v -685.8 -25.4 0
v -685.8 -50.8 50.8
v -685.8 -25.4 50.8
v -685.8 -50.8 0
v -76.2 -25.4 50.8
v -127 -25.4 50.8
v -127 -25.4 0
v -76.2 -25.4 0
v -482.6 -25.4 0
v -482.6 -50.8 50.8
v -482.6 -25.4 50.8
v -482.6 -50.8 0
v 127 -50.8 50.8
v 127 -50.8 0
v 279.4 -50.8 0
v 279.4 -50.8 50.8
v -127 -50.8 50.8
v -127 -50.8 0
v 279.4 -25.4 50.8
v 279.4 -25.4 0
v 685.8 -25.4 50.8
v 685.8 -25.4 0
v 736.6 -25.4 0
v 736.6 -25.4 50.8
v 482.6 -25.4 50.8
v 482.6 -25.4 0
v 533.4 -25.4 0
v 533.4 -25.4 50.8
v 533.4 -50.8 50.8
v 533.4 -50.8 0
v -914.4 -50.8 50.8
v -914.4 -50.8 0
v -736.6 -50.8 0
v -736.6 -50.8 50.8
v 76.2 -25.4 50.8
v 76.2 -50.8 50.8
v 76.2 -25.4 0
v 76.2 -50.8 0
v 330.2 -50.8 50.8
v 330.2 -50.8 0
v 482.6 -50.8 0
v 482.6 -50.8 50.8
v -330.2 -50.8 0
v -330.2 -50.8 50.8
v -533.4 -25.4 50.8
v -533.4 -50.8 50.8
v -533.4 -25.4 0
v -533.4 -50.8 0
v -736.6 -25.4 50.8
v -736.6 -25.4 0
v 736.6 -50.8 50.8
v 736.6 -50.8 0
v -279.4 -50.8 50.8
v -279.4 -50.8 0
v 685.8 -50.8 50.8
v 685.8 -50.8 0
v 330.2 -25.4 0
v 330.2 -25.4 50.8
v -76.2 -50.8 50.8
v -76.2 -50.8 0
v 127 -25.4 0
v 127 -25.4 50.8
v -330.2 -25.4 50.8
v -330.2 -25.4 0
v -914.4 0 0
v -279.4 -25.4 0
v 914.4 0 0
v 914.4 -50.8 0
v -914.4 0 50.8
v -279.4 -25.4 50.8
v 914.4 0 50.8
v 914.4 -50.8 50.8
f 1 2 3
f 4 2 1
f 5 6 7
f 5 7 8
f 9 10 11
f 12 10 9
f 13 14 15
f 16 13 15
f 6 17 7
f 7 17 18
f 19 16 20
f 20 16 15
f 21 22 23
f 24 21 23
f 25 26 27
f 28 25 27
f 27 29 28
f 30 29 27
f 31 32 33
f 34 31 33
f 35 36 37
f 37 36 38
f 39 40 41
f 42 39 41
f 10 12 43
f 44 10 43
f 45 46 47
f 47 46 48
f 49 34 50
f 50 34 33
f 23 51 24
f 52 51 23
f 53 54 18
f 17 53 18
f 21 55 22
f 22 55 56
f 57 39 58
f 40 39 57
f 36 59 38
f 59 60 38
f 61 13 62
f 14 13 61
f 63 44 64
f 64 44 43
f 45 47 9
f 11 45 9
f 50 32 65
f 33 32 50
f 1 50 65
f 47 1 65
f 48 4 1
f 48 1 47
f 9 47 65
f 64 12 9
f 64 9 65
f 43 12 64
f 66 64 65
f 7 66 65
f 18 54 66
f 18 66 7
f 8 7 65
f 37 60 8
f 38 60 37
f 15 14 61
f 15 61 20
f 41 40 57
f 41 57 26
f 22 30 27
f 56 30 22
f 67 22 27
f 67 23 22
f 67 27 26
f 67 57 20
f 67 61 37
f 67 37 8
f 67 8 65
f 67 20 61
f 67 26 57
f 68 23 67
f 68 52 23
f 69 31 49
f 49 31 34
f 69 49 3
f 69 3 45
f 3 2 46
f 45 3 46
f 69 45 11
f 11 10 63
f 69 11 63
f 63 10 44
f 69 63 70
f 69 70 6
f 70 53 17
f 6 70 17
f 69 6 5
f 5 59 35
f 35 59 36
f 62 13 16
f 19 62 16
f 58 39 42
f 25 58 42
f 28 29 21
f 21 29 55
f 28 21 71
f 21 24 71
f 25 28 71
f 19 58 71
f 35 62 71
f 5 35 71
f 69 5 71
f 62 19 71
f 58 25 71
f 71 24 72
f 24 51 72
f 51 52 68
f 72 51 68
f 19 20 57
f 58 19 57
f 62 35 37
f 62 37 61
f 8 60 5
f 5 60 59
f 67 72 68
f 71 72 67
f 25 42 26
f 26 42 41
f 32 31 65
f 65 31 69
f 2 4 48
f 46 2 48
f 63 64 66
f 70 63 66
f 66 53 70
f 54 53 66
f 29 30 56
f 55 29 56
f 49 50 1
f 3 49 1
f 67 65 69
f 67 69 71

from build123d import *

# Parameters (mm, degrees)
F1_DEPTH = 25.4
F0_W     = 482.6
F0_H     = 50.8
F0_W_2   = 152.4
F2_W     = 2438.4
F2_H     = 50.8
F3_DEPTH = 25.4
F5_W     = 304.8
F5_H     = 50.8
F6_DEPTH = 63.5
F7_ANGLE = -90


with BuildPart() as f1:
    # F0 (on Top) → F1 (new body)
    with BuildSketch(Plane.XY):
        Polygon((-76.2, 0), (0, 0), (76.2, 0), (76.2, 50.8), (-76.2, 50.8), align=None)
    extrude(amount=F1_DEPTH)


with BuildPart() as f1b:
    # F0 (on Top) → F1, piece 2 (new body)
    with BuildSketch(Plane.XY):
        with Locations((-977.9, 25.4)):
            Rectangle(F0_W, F0_H)
    extrude(amount=F1_DEPTH)


with BuildPart() as f1c:
    # F0 (on Top) → F1, piece 3 (new body)
    with BuildSketch(Plane.XY):
        with Locations((977.9, 25.4)):
            Rectangle(F0_W, F0_H)
    extrude(amount=F1_DEPTH)


with BuildPart() as f1d:
    # F0 (on Top) → F1, piece 4 (new body)
    with BuildSketch(Plane.XY):
        with Locations((203.2, 25.4)):
            Rectangle(F0_W_2, F0_H)
    extrude(amount=F1_DEPTH)


with BuildPart() as f1e:
    # F0 (on Top) → F1, piece 5 (new body)
    with BuildSketch(Plane.XY):
        with Locations((406.4, 25.4)):
            Rectangle(F0_W_2, F0_H)
    extrude(amount=F1_DEPTH)


with BuildPart() as f1f:
    # F0 (on Top) → F1, piece 6 (new body)
    with BuildSketch(Plane.XY):
        with Locations((609.6, 25.4)):
            Rectangle(F0_W_2, F0_H)
    extrude(amount=F1_DEPTH)


with BuildPart() as f1g:
    # F0 (on Top) → F1, piece 7 (new body)
    with BuildSketch(Plane.XY):
        with Locations((-203.2, 25.4)):
            Rectangle(F0_W_2, F0_H)
    extrude(amount=F1_DEPTH)


with BuildPart() as f1h:
    # F0 (on Top) → F1, piece 8 (new body)
    with BuildSketch(Plane.XY):
        with Locations((-406.4, 25.4)):
            Rectangle(F0_W_2, F0_H)
    extrude(amount=F1_DEPTH)


with BuildPart() as f1i:
    # F0 (on Top) → F1, piece 9 (new body)
    with BuildSketch(Plane.XY):
        with Locations((-609.6, 25.4)):
            Rectangle(F0_W_2, F0_H)
    extrude(amount=F1_DEPTH)


with BuildPart() as f3:
    # F2 (on face) → F3 (new body)
    with BuildSketch(Plane.XY.offset(25.4)):
        with Locations((0, 25.4)):
            Rectangle(F2_W, F2_H)
    extrude(amount=F3_DEPTH)


with BuildPart() as f1b_1:
    add(f1b.part)

    # F4: union F1c, F1, F1d, F1e, F1f, F1g, F1h, F1i, F3
    add(f1c.part)
    add(f1.part)
    add(f1d.part)
    add(f1e.part)
    add(f1f.part)
    add(f1g.part)
    add(f1h.part)
    add(f1i.part)
    add(f3.part)

    # F5 (on face) → F6 (cut)
    with BuildSketch(Plane.XZ):
        with Locations((-1066.8, 25.4)):
            Rectangle(F5_W, F5_H)
        with Locations((1066.8, 25.4)):
            Rectangle(F5_W, F5_H)
    extrude(amount=-F6_DEPTH, mode=Mode.SUBTRACT)


with BuildPart() as f1b_2:
    # F7: moved
    add(f1b_1.part.rotate(Axis((0, 0, 50.8), (1, 0, 0)), F7_ANGLE))


solid = f1b_2.part
